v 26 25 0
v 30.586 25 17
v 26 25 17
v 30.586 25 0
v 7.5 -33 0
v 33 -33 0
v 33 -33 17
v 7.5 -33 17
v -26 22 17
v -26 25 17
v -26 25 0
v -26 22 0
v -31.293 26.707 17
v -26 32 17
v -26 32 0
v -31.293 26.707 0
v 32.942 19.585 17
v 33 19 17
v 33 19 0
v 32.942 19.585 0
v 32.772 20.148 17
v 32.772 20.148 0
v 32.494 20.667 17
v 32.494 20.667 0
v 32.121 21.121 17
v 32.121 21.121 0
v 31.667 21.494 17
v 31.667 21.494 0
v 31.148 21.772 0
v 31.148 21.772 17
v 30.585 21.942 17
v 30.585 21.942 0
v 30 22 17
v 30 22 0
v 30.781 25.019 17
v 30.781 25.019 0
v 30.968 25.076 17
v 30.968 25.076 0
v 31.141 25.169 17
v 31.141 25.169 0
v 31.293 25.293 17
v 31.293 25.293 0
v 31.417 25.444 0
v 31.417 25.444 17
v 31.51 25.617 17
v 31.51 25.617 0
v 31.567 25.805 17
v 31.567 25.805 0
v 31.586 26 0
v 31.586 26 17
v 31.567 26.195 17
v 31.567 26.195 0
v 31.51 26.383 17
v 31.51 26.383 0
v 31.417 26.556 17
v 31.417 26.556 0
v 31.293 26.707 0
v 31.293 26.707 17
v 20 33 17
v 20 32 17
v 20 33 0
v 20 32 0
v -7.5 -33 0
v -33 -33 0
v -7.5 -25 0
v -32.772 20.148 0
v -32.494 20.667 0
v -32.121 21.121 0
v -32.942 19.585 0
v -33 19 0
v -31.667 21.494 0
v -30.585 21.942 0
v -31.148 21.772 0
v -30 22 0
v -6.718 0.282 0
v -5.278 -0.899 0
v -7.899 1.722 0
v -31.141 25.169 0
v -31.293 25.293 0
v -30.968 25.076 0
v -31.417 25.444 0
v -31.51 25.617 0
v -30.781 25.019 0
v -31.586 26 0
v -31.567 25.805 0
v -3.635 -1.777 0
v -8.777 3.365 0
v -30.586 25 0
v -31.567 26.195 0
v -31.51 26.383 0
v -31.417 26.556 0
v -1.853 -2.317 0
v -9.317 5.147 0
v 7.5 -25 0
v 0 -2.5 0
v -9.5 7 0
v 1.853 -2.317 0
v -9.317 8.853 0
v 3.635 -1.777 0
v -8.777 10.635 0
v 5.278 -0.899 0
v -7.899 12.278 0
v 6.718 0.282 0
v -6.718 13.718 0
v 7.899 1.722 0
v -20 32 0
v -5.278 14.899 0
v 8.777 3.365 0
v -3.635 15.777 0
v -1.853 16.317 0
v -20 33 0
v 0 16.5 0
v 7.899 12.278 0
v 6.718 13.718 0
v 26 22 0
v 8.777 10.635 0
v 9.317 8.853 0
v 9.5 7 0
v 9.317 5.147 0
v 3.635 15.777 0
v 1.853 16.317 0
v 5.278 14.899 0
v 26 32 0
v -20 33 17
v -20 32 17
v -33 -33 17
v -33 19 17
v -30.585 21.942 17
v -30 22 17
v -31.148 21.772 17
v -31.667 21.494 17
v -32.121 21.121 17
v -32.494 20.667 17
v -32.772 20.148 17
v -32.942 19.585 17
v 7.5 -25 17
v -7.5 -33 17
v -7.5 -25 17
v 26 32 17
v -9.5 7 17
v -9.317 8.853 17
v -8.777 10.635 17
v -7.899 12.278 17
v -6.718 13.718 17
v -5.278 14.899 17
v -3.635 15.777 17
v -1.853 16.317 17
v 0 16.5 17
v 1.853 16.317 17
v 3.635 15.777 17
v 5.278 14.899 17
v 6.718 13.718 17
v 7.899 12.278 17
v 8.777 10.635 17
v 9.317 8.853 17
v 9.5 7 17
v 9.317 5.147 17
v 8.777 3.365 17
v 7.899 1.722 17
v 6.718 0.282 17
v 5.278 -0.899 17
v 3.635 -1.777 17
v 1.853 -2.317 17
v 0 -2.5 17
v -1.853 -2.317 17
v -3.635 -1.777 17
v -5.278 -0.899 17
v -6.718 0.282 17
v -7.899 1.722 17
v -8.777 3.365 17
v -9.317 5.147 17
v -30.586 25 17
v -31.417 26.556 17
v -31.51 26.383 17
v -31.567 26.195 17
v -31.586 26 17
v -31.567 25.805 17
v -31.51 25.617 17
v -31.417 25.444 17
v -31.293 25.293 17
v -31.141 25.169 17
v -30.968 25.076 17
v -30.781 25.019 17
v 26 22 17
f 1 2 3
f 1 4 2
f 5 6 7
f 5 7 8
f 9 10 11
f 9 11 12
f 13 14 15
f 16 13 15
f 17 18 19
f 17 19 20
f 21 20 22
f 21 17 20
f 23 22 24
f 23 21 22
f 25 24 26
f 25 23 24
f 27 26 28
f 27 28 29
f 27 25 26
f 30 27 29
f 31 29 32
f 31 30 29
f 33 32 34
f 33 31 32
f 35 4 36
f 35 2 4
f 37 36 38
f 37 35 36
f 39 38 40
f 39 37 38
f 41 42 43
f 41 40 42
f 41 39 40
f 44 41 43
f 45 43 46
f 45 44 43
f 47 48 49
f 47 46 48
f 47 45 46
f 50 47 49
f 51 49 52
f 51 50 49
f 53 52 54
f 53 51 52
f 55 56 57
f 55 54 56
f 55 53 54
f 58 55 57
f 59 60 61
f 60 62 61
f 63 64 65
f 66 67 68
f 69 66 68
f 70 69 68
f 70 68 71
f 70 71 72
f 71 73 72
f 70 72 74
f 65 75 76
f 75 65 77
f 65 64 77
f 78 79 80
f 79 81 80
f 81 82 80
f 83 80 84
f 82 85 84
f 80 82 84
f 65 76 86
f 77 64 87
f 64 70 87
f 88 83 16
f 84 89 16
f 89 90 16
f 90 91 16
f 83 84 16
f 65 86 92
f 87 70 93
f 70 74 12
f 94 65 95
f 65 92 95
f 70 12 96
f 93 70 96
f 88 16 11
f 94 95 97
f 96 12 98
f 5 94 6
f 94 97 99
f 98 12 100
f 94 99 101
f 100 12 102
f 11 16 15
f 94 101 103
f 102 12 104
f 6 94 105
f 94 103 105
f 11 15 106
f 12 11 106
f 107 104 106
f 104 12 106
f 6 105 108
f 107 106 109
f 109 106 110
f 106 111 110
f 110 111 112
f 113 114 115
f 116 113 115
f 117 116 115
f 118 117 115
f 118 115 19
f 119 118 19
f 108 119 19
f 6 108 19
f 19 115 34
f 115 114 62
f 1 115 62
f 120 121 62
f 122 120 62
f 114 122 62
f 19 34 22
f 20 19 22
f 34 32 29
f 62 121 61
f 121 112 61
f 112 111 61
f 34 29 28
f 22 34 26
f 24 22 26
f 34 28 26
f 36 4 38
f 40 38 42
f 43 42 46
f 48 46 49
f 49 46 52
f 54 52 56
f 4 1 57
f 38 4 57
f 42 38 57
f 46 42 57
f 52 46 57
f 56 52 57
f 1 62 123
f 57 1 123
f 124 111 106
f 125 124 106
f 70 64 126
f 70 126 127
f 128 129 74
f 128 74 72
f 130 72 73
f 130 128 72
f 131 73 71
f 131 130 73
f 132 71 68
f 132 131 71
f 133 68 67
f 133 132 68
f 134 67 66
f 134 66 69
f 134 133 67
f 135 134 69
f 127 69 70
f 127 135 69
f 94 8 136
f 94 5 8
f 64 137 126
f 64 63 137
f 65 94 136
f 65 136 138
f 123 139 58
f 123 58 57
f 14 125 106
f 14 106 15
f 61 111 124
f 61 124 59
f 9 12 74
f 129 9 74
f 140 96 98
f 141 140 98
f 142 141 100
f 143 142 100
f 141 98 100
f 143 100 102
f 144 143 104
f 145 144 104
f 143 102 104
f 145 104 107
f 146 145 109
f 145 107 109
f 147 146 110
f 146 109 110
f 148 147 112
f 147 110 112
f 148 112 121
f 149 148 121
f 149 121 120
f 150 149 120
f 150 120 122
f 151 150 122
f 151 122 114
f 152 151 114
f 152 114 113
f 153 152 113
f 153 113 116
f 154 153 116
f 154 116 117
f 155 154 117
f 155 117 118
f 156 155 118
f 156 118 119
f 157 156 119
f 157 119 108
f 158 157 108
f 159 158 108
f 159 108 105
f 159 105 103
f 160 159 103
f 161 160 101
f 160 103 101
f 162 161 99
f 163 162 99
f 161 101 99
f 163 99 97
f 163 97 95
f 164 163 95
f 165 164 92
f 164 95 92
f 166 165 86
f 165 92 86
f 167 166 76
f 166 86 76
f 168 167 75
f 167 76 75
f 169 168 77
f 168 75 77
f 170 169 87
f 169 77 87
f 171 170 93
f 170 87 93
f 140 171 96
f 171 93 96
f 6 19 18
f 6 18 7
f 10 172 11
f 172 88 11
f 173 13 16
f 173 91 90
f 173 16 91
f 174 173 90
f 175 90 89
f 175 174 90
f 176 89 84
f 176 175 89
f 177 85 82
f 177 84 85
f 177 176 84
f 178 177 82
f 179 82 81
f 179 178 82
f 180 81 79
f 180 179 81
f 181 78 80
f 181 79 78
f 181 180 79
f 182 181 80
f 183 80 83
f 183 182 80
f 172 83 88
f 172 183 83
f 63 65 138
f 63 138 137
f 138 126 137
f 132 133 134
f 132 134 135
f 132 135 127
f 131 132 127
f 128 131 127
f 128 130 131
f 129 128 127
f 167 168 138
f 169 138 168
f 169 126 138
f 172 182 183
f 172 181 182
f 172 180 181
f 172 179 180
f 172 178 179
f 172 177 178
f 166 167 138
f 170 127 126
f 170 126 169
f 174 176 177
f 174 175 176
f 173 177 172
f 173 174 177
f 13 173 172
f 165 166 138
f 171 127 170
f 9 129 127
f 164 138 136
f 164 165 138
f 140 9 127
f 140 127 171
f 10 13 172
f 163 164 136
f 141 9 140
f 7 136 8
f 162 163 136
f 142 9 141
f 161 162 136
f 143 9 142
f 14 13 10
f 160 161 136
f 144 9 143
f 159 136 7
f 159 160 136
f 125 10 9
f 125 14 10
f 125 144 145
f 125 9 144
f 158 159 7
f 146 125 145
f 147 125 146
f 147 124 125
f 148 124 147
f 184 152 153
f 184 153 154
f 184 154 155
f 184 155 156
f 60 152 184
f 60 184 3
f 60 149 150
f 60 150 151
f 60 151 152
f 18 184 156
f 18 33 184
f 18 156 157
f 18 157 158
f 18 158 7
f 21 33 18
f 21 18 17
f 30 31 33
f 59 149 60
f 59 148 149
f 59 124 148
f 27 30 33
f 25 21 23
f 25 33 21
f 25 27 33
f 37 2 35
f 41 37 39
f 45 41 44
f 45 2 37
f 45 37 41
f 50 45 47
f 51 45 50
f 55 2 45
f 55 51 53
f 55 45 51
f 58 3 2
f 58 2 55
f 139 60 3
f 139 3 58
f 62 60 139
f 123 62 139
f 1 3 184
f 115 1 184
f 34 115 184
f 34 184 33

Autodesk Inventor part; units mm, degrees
ref_plane "YZ Plane" through (0, 0, 0) normal (1, 0, 0) x (0, 1, 0)
ref_plane "XZ Plane" through (0, 0, 0) normal (0, 1, 0) x (-1, 0, 0)
ref_plane "XY Plane" through (0, 0, 0) normal (0, 0, 1) x (1, 0, 0)
sketch "Sketch2" plane through (0, 0, 0) normal (0, 0, 1) x (1, 0, 0)
  line L0 (33, -33) -> (-33, -33)
  line L1 (-33, -33) -> (-33, 33)
  line L2 (-33, 33) -> (33, 33)
  line L3 (33, 33) -> (33, -33)
  line L4 (0, 0) -> (0, 20.7499)
  line L5 (0, 0) -> (18.2964, 0)
  point P0 (0, 33)
  point P1 (33, 0)
  dimension "d17" = 66
  dimension "d18" = 66
extrude "Extrusion1" add sketch "Sketch2" along normal blind 17
sketch "Sketch3" plane through (0, 0, 0) normal (0, 0, -1) x (-1, 0, 0)
  line L0 (33, -33) -> (33, 33) projected
  line L1 (33, 33) -> (-33, 33) projected
  line L2 (-33, 33) -> (-33, -33) projected
  line L3 (20, 32) -> (-20, 32)
  line L4 (-20, 32) -> (-20, 33)
  line L5 (-20, 33) -> (20, 33)
  line L6 (20, 33) -> (20, 32)
  line L7 (-20, 32) -> (-33, 32)
  line L8 (20, 32) -> (33, 32)
  point P0 (0, 0)
  point P1 (0, 33)
  dimension "d21" = 40
  dimension "d22" = 1
extrude "Extrusion2" cut sketch "Sketch3" against normal through all contours L8 L6 L1 L0 | L7 L2 L1 L4
chamfer "Chamfer1" distance 7 angle 45 2 edges at (33, 32, 8.5) (-33, 32, 8.5)
sketch "Sketch4" plane through (0, 0, 0) normal (0, 0, -1) x (-1, 0, 0)
  line L0 (-33, 25) -> (-33, -33) projected
  line L1 (33, -33) -> (33, 25) projected
  line L2 (33, 25) -> (26, 25)
  line L3 (26, 25) -> (26, 22)
  line L4 (26, 22) -> (33, 22)
  line L5 (-33, 25) -> (-26, 25)
  line L6 (-26, 25) -> (-26, 22)
  line L7 (-26, 22) -> (-33, 22)
  point P0 (0, 0)
  dimension "d28" = 7
  dimension "d29" = 3
  dimension "d30" = 7
  dimension "d31" = 3
extrude "Extrusion3" cut sketch "Sketch4" against normal through all
fillet "Fillet1" radius 1 2 edges at (-33, 25, 8.5) (33, 25, 8.5)
fillet "Fillet2" radius 3 2 edges at (33, 22, 8.5) (-33, 22, 8.5)
sketch "Sketch5" plane through (0, 0, 0) normal (0, 0, -1) x (-1, 0, 0)
  line L0 (-33, -33) -> (33, -33) projected
  line L1 (7.5, -33) -> (-7.5, -33)
  line L2 (-7.5, -33) -> (-7.5, -25)
  line L3 (-7.5, -25) -> (7.5, -25)
  line L4 (7.5, -25) -> (7.5, -33)
  point P0 (0, 0)
  point P1 (0, -33)
  dimension "d36" = 15
  dimension "d37" = 8
extrude "Extrusion4" cut sketch "Sketch5" against normal through all
sketch "Sketch6" plane through (0, 0, 0) normal (0, 0, -1) x (-1, 0, 0)
  line L0 (33, -33) -> (33, 19) projected
  line L1 (20, 33) -> (-20, 33) projected
  circle A0 centre (0, 7) radius 9.5
  point P0 (0, 0)
  dimension "d40" = 19
  dimension "d41" = 26
  dimension "d42" = 33
extrude "Extrusion5" cut sketch "Sketch6" against normal through all
properties part number "Holder" material "Steel, Carbon"
